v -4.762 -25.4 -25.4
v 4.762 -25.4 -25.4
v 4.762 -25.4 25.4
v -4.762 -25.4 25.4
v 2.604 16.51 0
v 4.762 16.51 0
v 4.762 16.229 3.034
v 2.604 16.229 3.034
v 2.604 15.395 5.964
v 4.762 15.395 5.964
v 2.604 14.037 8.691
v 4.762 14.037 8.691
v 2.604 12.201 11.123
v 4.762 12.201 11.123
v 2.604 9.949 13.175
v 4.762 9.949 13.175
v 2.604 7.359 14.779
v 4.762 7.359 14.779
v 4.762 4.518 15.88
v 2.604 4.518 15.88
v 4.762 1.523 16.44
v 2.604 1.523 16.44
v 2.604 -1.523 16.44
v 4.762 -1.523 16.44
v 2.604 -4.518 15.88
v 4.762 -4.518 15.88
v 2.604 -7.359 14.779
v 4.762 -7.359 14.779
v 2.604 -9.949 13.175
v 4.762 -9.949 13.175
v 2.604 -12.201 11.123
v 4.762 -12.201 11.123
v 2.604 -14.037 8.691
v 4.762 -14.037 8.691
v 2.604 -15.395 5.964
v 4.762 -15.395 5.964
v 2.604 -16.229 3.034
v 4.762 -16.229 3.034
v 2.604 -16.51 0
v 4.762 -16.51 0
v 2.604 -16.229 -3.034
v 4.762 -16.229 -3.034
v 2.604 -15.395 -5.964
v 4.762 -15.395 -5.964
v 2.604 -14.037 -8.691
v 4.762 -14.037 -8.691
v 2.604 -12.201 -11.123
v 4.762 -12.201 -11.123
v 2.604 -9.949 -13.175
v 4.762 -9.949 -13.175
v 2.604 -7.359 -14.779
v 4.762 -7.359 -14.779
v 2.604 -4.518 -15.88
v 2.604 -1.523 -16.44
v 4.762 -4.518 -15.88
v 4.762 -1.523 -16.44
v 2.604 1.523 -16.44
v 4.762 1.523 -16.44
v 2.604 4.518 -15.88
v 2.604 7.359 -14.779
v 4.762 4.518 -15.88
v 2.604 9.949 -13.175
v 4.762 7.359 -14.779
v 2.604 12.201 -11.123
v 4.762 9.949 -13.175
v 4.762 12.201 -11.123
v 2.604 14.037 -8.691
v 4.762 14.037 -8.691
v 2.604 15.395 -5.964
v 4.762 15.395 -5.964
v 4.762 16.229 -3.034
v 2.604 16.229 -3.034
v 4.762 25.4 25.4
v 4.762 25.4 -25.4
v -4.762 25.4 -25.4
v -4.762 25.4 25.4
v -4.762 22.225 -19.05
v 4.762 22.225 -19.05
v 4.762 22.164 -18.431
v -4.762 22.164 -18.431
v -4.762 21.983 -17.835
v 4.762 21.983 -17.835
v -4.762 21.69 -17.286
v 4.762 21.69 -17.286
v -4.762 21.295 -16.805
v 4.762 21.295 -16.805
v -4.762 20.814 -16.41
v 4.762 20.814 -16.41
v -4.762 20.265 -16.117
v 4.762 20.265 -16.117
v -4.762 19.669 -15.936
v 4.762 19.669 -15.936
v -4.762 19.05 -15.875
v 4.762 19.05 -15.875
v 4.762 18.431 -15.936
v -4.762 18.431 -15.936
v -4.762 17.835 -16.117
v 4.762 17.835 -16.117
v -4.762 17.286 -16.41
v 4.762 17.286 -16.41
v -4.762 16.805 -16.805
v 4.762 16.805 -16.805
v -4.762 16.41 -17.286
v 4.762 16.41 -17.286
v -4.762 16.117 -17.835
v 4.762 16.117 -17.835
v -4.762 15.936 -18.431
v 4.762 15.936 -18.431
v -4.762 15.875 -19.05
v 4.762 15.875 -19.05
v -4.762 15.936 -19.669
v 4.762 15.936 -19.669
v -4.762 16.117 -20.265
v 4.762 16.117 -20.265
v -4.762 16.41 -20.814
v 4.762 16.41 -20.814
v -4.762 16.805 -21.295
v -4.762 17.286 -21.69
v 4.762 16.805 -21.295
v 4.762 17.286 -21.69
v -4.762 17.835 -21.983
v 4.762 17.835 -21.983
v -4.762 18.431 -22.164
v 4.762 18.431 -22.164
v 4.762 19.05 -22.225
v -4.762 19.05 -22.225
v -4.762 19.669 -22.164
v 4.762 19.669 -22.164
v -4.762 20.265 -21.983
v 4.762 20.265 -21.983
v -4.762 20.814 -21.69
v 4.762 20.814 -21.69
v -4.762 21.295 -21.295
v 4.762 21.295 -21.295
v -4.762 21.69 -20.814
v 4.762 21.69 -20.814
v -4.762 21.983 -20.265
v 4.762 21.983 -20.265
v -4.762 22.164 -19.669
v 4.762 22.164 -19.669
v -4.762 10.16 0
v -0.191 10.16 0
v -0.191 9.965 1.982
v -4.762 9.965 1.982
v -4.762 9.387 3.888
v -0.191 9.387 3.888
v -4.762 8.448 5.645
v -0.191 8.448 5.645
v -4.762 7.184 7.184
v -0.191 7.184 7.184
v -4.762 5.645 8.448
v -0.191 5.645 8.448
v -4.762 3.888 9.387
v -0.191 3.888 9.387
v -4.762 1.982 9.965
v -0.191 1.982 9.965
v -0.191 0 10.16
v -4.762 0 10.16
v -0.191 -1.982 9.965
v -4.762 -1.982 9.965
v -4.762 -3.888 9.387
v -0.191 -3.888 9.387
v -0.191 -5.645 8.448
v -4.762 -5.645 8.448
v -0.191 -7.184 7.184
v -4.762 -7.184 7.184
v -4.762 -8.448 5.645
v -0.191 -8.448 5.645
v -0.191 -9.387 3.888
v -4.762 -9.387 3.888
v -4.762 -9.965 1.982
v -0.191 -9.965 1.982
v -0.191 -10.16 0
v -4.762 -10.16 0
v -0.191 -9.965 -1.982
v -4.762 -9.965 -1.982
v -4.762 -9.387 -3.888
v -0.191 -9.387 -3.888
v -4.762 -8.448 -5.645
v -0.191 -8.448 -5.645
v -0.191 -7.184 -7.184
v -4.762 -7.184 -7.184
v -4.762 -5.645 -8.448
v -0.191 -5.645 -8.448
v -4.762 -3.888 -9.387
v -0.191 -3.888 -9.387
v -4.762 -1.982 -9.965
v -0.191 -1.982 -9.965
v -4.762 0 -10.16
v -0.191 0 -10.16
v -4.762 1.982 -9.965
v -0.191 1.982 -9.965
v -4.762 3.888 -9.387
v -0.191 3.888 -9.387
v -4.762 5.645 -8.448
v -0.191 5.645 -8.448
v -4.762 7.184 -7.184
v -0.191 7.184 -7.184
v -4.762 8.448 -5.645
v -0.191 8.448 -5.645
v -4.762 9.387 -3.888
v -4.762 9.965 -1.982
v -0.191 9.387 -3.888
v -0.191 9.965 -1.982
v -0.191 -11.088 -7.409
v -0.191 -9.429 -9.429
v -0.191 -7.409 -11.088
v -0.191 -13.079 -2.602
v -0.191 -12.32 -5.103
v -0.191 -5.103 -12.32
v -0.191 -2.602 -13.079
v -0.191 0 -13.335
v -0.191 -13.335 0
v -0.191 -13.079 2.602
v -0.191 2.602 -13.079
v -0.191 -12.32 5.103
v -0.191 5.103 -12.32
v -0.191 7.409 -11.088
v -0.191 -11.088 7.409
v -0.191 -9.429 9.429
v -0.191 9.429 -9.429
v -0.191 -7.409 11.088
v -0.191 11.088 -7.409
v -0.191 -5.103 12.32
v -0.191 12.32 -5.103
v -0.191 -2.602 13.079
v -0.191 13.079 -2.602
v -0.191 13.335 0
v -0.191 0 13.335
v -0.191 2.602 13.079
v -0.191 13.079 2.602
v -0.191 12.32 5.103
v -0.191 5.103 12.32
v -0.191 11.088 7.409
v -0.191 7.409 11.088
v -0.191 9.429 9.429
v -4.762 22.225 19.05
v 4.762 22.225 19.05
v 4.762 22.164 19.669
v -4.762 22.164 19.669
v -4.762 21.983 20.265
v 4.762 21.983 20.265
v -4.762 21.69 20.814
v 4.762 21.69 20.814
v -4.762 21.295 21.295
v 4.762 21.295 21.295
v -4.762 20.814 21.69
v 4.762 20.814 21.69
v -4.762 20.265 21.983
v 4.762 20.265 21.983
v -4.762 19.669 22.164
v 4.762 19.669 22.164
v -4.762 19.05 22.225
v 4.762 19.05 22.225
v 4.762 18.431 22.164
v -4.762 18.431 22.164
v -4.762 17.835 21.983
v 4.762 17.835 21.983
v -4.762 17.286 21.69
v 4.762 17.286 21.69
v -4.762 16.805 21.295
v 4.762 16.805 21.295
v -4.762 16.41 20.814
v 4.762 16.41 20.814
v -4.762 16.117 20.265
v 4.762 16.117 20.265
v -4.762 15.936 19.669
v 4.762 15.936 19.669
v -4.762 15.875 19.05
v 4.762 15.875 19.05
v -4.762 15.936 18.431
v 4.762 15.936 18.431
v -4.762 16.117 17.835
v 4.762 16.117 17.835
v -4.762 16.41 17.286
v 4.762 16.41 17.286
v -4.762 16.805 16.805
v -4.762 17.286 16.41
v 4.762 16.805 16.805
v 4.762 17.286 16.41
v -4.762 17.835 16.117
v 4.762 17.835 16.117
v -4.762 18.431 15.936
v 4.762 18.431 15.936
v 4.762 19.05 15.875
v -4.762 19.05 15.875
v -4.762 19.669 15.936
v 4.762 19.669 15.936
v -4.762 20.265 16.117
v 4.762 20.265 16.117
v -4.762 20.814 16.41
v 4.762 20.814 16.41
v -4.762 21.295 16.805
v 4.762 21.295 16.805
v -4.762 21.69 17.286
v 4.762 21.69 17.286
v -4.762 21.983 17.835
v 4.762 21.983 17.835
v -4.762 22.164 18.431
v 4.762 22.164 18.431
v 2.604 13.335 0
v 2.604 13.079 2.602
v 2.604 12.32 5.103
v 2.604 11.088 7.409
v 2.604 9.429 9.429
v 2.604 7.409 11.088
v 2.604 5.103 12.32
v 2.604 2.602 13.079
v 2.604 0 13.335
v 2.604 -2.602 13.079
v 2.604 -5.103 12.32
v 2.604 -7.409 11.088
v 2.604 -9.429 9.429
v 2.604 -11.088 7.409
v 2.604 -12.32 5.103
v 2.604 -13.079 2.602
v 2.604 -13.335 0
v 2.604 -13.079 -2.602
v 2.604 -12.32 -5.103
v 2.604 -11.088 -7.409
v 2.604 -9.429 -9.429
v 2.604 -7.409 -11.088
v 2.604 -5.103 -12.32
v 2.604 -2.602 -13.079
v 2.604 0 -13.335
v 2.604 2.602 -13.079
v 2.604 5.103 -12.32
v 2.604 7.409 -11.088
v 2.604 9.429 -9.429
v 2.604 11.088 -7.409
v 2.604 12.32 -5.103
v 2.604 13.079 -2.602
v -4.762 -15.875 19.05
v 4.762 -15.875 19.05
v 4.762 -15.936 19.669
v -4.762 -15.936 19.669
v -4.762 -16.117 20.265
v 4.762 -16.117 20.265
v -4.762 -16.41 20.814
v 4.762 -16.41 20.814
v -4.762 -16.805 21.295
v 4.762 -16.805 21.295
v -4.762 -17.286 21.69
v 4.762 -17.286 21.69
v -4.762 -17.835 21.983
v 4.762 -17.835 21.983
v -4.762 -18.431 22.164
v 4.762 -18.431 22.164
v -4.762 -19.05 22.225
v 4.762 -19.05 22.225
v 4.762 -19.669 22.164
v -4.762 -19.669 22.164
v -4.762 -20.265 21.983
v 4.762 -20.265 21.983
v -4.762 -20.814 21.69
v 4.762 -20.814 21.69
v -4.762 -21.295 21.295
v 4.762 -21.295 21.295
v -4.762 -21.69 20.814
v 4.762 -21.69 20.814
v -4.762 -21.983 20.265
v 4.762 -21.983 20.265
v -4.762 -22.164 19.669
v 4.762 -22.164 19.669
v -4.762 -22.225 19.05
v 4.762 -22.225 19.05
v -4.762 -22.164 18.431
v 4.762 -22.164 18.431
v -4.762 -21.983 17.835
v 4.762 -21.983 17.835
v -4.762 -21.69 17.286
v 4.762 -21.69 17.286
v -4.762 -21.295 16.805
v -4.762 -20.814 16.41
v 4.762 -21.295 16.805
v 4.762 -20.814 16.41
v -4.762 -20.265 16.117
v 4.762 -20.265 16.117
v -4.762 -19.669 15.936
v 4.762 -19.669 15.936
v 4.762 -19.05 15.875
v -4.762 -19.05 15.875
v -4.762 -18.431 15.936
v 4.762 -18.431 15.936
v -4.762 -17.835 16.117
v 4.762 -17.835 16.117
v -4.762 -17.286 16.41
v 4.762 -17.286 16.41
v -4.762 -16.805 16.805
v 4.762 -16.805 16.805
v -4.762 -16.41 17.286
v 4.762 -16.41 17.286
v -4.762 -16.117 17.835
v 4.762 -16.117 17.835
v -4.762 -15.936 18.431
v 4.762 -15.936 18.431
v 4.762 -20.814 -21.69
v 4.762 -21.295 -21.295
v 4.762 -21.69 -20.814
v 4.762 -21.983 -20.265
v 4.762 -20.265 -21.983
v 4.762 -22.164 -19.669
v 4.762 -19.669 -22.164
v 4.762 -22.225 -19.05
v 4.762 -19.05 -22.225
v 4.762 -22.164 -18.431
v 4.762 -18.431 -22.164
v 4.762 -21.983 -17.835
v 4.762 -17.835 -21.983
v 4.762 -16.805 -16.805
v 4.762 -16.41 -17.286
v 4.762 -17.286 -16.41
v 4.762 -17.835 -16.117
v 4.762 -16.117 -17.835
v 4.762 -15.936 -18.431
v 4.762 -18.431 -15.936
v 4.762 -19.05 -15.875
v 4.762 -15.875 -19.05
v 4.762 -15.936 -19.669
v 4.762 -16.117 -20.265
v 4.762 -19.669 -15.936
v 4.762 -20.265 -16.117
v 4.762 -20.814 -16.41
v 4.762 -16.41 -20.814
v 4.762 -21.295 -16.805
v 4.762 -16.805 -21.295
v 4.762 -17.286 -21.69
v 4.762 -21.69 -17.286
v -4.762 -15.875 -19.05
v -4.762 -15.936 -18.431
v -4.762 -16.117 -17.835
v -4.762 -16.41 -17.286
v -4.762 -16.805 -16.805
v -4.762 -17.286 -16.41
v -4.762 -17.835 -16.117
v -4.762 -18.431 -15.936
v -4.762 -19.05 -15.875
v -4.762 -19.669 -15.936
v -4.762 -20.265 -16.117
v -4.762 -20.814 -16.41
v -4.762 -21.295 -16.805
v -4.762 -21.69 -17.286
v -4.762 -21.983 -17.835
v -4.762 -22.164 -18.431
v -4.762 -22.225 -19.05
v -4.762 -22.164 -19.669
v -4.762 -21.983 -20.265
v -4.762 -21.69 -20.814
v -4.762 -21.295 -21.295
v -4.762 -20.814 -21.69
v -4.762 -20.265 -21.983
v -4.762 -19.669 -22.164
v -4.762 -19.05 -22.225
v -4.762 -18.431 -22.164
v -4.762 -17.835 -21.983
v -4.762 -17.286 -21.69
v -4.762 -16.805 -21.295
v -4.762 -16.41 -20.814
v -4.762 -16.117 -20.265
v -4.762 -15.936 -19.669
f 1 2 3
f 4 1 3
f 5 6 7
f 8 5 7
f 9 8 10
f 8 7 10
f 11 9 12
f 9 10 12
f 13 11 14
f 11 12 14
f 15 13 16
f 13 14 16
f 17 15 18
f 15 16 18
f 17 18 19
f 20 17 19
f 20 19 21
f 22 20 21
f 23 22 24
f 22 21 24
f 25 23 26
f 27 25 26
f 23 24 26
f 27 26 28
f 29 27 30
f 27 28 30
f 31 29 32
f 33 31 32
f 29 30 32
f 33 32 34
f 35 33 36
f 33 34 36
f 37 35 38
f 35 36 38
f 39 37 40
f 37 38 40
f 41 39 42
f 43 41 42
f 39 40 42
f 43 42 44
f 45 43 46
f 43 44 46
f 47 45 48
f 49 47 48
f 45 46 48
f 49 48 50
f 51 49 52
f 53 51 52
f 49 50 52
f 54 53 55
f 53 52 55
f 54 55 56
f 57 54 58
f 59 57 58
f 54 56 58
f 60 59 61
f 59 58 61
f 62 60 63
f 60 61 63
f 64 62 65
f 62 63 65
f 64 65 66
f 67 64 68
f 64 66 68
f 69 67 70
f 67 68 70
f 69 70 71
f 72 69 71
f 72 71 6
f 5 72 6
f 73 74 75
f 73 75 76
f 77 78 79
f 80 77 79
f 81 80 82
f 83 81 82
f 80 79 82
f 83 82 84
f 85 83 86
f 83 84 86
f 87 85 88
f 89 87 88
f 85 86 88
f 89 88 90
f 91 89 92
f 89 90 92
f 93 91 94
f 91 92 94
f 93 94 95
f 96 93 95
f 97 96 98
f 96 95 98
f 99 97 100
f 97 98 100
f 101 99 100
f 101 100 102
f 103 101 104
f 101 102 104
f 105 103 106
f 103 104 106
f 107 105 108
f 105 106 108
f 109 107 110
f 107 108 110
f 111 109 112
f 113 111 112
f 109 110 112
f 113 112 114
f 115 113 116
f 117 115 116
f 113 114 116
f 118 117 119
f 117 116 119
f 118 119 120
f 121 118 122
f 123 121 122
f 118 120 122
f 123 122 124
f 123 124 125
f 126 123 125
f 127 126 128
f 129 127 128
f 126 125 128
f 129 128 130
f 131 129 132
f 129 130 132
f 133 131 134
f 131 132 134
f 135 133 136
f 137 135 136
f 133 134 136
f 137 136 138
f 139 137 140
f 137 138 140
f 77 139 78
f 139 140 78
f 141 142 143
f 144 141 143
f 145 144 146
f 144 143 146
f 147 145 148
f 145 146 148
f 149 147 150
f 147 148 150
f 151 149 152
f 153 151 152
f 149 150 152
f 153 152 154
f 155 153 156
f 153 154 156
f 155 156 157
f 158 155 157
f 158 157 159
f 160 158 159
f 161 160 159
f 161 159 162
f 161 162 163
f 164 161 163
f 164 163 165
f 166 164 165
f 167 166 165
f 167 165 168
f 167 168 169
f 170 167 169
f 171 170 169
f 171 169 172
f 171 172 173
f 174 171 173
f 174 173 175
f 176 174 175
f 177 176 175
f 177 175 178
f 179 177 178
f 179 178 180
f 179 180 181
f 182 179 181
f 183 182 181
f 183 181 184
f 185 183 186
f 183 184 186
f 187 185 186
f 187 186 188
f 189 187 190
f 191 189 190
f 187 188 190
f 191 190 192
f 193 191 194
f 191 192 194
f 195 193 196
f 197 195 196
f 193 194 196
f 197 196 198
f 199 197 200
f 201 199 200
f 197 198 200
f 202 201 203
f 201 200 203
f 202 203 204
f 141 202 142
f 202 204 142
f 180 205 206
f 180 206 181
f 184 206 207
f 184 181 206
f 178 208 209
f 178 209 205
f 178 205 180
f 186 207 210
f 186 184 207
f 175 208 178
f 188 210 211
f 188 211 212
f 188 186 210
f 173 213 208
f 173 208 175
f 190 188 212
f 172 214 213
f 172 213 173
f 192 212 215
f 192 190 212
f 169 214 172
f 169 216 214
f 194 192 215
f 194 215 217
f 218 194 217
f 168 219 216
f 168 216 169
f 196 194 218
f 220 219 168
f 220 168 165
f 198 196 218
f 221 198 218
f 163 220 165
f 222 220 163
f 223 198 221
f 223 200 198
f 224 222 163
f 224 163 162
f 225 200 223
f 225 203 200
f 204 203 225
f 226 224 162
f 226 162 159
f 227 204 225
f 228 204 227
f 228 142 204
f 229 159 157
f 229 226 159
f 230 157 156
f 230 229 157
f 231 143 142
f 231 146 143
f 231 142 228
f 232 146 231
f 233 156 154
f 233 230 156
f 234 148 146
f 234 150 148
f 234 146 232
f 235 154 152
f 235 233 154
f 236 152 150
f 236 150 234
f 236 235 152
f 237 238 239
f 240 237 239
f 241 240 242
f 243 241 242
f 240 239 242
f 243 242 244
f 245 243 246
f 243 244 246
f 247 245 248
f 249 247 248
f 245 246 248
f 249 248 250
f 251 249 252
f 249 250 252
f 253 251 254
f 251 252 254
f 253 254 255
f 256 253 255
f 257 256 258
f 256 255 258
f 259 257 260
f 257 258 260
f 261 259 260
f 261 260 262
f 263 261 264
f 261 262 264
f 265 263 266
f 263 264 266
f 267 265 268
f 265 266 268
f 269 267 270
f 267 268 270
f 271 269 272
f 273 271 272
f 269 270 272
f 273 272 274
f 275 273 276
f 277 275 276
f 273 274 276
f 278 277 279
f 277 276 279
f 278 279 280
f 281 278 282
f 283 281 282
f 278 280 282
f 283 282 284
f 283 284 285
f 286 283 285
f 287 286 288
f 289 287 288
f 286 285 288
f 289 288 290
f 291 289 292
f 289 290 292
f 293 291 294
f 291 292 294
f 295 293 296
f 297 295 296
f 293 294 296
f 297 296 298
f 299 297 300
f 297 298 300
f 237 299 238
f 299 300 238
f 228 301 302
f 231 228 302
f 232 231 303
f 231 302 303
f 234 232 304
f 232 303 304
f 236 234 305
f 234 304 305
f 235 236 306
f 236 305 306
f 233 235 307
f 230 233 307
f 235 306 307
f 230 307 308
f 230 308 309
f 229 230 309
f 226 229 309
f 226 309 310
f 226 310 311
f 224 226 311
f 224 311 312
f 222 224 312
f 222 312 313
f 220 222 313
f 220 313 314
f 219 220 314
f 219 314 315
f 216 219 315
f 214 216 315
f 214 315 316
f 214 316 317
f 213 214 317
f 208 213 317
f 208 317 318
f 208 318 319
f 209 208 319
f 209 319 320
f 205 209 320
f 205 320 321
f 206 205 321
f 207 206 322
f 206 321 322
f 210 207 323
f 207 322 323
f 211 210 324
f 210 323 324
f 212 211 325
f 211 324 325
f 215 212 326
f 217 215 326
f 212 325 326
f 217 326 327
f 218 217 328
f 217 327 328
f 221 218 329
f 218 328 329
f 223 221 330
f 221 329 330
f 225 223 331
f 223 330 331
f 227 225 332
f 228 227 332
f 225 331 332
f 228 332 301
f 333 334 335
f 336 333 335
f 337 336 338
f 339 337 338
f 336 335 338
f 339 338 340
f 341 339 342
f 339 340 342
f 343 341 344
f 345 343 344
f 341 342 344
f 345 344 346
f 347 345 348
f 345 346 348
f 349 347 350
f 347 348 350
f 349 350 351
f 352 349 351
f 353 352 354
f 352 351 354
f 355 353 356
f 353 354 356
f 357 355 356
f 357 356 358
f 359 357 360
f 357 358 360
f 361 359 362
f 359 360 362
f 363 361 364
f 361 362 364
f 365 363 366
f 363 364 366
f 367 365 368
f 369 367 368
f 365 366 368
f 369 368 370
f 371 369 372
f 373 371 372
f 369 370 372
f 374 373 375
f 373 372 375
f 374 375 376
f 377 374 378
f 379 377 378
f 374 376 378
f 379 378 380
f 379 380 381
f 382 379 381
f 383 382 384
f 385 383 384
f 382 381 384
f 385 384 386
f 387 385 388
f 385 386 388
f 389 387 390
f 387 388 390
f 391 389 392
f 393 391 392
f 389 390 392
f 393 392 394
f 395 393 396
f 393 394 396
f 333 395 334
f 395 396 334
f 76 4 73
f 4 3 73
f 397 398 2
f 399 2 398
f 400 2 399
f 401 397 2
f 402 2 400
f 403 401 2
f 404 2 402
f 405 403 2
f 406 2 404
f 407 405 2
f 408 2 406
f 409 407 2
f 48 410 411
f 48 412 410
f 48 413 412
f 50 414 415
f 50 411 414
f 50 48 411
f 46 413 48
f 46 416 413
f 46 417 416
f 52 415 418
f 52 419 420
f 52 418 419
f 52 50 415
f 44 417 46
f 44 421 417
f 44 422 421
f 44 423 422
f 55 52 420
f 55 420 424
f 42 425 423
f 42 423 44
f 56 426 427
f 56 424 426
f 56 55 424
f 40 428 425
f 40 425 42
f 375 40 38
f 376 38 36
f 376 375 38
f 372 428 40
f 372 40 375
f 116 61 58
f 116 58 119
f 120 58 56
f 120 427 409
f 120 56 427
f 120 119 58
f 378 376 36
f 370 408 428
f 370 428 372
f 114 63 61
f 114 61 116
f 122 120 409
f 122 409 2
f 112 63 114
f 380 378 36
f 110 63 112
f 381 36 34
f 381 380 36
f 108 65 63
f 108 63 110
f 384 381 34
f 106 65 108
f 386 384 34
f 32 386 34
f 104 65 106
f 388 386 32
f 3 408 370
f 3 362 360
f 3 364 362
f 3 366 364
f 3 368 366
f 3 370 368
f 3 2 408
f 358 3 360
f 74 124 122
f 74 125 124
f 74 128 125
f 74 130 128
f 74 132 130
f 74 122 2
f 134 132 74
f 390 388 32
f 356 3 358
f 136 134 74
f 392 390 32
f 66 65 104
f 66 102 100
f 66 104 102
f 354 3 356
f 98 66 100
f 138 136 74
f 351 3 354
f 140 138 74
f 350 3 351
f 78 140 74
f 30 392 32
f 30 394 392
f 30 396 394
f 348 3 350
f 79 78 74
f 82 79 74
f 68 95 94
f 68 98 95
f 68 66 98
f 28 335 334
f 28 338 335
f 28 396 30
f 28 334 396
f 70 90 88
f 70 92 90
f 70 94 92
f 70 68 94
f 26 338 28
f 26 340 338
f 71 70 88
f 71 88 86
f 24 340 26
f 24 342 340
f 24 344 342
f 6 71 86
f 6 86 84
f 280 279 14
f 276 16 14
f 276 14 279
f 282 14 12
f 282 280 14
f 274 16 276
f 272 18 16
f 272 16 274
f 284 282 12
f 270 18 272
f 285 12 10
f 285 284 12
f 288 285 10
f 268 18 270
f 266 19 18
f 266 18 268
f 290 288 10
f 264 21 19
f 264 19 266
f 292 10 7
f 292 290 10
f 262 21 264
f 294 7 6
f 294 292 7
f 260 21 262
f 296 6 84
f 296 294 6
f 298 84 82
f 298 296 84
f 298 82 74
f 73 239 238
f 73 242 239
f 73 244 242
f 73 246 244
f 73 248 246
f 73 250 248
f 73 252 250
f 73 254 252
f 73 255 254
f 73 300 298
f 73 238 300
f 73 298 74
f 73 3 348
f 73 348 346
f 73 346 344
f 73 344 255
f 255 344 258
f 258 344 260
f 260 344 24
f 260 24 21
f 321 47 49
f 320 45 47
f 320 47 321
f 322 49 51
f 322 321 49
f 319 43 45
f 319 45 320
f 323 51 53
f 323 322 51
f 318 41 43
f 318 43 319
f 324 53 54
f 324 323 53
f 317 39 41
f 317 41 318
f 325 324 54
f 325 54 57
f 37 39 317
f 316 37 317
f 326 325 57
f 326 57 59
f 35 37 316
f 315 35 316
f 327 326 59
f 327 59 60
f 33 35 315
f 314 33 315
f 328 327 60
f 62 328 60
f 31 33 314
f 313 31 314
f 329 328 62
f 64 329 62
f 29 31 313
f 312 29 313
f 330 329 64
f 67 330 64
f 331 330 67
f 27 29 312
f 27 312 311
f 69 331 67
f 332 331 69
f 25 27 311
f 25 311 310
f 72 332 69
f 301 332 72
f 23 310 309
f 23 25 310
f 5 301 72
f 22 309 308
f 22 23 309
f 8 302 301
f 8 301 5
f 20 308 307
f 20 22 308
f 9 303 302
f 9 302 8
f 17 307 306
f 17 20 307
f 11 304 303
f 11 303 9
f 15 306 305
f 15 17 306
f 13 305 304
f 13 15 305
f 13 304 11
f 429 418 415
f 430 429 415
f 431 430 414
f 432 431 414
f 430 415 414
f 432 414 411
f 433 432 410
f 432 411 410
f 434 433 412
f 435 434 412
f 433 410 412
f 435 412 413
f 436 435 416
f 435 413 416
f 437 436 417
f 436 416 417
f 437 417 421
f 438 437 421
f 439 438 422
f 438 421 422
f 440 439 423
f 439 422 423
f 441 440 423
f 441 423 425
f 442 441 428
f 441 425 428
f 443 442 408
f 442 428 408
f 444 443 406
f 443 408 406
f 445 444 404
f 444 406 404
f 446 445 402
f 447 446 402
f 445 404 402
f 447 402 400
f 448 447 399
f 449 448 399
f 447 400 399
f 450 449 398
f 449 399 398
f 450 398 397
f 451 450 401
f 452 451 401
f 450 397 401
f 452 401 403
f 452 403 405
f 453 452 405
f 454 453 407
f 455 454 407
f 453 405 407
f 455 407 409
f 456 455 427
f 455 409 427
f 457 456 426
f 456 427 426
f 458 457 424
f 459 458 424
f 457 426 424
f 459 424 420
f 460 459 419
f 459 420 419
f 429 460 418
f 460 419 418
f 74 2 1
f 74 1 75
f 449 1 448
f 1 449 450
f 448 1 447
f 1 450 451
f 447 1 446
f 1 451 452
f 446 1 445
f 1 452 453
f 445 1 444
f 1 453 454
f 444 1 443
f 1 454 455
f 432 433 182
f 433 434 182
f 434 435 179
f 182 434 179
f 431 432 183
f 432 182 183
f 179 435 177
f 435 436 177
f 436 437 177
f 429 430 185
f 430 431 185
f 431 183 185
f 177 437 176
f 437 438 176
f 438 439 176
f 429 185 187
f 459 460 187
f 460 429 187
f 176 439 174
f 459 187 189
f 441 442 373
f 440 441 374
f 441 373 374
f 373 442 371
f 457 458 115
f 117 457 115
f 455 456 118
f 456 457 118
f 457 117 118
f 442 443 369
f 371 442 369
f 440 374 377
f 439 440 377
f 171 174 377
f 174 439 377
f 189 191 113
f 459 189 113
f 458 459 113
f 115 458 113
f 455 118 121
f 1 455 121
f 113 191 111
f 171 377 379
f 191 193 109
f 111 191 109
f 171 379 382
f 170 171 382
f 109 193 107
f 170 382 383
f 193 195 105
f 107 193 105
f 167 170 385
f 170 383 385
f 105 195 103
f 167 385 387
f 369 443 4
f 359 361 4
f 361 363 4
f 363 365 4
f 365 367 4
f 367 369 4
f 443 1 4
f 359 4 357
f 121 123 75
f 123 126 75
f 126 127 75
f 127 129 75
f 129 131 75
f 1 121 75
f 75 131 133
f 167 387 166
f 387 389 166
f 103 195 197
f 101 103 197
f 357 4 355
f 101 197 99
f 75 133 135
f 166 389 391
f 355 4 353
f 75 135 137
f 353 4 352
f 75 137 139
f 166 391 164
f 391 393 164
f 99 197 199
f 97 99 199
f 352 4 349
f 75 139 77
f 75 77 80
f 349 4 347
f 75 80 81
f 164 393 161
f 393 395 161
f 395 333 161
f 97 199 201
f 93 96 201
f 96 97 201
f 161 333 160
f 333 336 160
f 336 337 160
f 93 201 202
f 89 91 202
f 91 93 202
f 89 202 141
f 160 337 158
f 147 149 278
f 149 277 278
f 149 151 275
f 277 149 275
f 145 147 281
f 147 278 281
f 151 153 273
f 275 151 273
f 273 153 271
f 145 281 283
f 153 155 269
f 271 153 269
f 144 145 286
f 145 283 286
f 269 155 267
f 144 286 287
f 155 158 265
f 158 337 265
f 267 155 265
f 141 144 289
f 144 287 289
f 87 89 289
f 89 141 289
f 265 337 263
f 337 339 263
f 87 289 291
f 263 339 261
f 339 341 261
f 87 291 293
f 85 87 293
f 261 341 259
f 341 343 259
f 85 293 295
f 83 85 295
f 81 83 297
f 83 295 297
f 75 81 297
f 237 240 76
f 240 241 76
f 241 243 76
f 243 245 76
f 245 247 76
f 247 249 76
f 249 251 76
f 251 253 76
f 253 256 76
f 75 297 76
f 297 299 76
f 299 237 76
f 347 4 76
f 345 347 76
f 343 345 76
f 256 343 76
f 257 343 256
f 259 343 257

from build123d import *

# Parameters (mm, degrees)
F0_W     = 50.8
F0_H     = 50.8
F1_DEPTH = 4.7625
F2_R     = 10.16
F3_DEPTH = 9.525
F4_R     = 16.51
F5_DEPTH = 2.159
F6_R     = 3.175
F7_DEPTH = 9.525
F8_R     = 13.335
F9_DEPTH = 4.953


with BuildPart() as f1:
    # F0 (on Right) → F1 (new body, symmetric)
    with BuildSketch(Plane.YZ):
        Rectangle(F0_W, F0_H)
    extrude(amount=F1_DEPTH, both=True)

    # F2 (on face) → F3 (cut, through all)
    with BuildSketch(Plane.YZ.offset(4.7625)):
        Circle(F2_R)
    extrude(amount=-F3_DEPTH, mode=Mode.SUBTRACT)

    # F4 (on face) → F5 (cut)
    with BuildSketch(Plane.YZ.offset(4.7625)):
        Circle(F4_R)
    extrude(amount=-F5_DEPTH, mode=Mode.SUBTRACT)

    # F6 (on face) → F7 (cut, through all)
    with BuildSketch(Plane.YZ.offset(4.7625)):
        with Locations((-19.05, 19.05)):
            Circle(F6_R)
        with Locations((19.05, 19.05)):
            Circle(F6_R)
        with Locations((-19.05, -19.05)):
            Circle(F6_R)
        with Locations((19.05, -19.05)):
            Circle(F6_R)
    extrude(amount=-F7_DEPTH, mode=Mode.SUBTRACT)

    # F8 (on face) → F9 (cut)
    with BuildSketch(Plane.YZ.offset(4.7625)):
        Circle(F8_R)
    extrude(amount=-F9_DEPTH, mode=Mode.SUBTRACT)


solid = f1.part
